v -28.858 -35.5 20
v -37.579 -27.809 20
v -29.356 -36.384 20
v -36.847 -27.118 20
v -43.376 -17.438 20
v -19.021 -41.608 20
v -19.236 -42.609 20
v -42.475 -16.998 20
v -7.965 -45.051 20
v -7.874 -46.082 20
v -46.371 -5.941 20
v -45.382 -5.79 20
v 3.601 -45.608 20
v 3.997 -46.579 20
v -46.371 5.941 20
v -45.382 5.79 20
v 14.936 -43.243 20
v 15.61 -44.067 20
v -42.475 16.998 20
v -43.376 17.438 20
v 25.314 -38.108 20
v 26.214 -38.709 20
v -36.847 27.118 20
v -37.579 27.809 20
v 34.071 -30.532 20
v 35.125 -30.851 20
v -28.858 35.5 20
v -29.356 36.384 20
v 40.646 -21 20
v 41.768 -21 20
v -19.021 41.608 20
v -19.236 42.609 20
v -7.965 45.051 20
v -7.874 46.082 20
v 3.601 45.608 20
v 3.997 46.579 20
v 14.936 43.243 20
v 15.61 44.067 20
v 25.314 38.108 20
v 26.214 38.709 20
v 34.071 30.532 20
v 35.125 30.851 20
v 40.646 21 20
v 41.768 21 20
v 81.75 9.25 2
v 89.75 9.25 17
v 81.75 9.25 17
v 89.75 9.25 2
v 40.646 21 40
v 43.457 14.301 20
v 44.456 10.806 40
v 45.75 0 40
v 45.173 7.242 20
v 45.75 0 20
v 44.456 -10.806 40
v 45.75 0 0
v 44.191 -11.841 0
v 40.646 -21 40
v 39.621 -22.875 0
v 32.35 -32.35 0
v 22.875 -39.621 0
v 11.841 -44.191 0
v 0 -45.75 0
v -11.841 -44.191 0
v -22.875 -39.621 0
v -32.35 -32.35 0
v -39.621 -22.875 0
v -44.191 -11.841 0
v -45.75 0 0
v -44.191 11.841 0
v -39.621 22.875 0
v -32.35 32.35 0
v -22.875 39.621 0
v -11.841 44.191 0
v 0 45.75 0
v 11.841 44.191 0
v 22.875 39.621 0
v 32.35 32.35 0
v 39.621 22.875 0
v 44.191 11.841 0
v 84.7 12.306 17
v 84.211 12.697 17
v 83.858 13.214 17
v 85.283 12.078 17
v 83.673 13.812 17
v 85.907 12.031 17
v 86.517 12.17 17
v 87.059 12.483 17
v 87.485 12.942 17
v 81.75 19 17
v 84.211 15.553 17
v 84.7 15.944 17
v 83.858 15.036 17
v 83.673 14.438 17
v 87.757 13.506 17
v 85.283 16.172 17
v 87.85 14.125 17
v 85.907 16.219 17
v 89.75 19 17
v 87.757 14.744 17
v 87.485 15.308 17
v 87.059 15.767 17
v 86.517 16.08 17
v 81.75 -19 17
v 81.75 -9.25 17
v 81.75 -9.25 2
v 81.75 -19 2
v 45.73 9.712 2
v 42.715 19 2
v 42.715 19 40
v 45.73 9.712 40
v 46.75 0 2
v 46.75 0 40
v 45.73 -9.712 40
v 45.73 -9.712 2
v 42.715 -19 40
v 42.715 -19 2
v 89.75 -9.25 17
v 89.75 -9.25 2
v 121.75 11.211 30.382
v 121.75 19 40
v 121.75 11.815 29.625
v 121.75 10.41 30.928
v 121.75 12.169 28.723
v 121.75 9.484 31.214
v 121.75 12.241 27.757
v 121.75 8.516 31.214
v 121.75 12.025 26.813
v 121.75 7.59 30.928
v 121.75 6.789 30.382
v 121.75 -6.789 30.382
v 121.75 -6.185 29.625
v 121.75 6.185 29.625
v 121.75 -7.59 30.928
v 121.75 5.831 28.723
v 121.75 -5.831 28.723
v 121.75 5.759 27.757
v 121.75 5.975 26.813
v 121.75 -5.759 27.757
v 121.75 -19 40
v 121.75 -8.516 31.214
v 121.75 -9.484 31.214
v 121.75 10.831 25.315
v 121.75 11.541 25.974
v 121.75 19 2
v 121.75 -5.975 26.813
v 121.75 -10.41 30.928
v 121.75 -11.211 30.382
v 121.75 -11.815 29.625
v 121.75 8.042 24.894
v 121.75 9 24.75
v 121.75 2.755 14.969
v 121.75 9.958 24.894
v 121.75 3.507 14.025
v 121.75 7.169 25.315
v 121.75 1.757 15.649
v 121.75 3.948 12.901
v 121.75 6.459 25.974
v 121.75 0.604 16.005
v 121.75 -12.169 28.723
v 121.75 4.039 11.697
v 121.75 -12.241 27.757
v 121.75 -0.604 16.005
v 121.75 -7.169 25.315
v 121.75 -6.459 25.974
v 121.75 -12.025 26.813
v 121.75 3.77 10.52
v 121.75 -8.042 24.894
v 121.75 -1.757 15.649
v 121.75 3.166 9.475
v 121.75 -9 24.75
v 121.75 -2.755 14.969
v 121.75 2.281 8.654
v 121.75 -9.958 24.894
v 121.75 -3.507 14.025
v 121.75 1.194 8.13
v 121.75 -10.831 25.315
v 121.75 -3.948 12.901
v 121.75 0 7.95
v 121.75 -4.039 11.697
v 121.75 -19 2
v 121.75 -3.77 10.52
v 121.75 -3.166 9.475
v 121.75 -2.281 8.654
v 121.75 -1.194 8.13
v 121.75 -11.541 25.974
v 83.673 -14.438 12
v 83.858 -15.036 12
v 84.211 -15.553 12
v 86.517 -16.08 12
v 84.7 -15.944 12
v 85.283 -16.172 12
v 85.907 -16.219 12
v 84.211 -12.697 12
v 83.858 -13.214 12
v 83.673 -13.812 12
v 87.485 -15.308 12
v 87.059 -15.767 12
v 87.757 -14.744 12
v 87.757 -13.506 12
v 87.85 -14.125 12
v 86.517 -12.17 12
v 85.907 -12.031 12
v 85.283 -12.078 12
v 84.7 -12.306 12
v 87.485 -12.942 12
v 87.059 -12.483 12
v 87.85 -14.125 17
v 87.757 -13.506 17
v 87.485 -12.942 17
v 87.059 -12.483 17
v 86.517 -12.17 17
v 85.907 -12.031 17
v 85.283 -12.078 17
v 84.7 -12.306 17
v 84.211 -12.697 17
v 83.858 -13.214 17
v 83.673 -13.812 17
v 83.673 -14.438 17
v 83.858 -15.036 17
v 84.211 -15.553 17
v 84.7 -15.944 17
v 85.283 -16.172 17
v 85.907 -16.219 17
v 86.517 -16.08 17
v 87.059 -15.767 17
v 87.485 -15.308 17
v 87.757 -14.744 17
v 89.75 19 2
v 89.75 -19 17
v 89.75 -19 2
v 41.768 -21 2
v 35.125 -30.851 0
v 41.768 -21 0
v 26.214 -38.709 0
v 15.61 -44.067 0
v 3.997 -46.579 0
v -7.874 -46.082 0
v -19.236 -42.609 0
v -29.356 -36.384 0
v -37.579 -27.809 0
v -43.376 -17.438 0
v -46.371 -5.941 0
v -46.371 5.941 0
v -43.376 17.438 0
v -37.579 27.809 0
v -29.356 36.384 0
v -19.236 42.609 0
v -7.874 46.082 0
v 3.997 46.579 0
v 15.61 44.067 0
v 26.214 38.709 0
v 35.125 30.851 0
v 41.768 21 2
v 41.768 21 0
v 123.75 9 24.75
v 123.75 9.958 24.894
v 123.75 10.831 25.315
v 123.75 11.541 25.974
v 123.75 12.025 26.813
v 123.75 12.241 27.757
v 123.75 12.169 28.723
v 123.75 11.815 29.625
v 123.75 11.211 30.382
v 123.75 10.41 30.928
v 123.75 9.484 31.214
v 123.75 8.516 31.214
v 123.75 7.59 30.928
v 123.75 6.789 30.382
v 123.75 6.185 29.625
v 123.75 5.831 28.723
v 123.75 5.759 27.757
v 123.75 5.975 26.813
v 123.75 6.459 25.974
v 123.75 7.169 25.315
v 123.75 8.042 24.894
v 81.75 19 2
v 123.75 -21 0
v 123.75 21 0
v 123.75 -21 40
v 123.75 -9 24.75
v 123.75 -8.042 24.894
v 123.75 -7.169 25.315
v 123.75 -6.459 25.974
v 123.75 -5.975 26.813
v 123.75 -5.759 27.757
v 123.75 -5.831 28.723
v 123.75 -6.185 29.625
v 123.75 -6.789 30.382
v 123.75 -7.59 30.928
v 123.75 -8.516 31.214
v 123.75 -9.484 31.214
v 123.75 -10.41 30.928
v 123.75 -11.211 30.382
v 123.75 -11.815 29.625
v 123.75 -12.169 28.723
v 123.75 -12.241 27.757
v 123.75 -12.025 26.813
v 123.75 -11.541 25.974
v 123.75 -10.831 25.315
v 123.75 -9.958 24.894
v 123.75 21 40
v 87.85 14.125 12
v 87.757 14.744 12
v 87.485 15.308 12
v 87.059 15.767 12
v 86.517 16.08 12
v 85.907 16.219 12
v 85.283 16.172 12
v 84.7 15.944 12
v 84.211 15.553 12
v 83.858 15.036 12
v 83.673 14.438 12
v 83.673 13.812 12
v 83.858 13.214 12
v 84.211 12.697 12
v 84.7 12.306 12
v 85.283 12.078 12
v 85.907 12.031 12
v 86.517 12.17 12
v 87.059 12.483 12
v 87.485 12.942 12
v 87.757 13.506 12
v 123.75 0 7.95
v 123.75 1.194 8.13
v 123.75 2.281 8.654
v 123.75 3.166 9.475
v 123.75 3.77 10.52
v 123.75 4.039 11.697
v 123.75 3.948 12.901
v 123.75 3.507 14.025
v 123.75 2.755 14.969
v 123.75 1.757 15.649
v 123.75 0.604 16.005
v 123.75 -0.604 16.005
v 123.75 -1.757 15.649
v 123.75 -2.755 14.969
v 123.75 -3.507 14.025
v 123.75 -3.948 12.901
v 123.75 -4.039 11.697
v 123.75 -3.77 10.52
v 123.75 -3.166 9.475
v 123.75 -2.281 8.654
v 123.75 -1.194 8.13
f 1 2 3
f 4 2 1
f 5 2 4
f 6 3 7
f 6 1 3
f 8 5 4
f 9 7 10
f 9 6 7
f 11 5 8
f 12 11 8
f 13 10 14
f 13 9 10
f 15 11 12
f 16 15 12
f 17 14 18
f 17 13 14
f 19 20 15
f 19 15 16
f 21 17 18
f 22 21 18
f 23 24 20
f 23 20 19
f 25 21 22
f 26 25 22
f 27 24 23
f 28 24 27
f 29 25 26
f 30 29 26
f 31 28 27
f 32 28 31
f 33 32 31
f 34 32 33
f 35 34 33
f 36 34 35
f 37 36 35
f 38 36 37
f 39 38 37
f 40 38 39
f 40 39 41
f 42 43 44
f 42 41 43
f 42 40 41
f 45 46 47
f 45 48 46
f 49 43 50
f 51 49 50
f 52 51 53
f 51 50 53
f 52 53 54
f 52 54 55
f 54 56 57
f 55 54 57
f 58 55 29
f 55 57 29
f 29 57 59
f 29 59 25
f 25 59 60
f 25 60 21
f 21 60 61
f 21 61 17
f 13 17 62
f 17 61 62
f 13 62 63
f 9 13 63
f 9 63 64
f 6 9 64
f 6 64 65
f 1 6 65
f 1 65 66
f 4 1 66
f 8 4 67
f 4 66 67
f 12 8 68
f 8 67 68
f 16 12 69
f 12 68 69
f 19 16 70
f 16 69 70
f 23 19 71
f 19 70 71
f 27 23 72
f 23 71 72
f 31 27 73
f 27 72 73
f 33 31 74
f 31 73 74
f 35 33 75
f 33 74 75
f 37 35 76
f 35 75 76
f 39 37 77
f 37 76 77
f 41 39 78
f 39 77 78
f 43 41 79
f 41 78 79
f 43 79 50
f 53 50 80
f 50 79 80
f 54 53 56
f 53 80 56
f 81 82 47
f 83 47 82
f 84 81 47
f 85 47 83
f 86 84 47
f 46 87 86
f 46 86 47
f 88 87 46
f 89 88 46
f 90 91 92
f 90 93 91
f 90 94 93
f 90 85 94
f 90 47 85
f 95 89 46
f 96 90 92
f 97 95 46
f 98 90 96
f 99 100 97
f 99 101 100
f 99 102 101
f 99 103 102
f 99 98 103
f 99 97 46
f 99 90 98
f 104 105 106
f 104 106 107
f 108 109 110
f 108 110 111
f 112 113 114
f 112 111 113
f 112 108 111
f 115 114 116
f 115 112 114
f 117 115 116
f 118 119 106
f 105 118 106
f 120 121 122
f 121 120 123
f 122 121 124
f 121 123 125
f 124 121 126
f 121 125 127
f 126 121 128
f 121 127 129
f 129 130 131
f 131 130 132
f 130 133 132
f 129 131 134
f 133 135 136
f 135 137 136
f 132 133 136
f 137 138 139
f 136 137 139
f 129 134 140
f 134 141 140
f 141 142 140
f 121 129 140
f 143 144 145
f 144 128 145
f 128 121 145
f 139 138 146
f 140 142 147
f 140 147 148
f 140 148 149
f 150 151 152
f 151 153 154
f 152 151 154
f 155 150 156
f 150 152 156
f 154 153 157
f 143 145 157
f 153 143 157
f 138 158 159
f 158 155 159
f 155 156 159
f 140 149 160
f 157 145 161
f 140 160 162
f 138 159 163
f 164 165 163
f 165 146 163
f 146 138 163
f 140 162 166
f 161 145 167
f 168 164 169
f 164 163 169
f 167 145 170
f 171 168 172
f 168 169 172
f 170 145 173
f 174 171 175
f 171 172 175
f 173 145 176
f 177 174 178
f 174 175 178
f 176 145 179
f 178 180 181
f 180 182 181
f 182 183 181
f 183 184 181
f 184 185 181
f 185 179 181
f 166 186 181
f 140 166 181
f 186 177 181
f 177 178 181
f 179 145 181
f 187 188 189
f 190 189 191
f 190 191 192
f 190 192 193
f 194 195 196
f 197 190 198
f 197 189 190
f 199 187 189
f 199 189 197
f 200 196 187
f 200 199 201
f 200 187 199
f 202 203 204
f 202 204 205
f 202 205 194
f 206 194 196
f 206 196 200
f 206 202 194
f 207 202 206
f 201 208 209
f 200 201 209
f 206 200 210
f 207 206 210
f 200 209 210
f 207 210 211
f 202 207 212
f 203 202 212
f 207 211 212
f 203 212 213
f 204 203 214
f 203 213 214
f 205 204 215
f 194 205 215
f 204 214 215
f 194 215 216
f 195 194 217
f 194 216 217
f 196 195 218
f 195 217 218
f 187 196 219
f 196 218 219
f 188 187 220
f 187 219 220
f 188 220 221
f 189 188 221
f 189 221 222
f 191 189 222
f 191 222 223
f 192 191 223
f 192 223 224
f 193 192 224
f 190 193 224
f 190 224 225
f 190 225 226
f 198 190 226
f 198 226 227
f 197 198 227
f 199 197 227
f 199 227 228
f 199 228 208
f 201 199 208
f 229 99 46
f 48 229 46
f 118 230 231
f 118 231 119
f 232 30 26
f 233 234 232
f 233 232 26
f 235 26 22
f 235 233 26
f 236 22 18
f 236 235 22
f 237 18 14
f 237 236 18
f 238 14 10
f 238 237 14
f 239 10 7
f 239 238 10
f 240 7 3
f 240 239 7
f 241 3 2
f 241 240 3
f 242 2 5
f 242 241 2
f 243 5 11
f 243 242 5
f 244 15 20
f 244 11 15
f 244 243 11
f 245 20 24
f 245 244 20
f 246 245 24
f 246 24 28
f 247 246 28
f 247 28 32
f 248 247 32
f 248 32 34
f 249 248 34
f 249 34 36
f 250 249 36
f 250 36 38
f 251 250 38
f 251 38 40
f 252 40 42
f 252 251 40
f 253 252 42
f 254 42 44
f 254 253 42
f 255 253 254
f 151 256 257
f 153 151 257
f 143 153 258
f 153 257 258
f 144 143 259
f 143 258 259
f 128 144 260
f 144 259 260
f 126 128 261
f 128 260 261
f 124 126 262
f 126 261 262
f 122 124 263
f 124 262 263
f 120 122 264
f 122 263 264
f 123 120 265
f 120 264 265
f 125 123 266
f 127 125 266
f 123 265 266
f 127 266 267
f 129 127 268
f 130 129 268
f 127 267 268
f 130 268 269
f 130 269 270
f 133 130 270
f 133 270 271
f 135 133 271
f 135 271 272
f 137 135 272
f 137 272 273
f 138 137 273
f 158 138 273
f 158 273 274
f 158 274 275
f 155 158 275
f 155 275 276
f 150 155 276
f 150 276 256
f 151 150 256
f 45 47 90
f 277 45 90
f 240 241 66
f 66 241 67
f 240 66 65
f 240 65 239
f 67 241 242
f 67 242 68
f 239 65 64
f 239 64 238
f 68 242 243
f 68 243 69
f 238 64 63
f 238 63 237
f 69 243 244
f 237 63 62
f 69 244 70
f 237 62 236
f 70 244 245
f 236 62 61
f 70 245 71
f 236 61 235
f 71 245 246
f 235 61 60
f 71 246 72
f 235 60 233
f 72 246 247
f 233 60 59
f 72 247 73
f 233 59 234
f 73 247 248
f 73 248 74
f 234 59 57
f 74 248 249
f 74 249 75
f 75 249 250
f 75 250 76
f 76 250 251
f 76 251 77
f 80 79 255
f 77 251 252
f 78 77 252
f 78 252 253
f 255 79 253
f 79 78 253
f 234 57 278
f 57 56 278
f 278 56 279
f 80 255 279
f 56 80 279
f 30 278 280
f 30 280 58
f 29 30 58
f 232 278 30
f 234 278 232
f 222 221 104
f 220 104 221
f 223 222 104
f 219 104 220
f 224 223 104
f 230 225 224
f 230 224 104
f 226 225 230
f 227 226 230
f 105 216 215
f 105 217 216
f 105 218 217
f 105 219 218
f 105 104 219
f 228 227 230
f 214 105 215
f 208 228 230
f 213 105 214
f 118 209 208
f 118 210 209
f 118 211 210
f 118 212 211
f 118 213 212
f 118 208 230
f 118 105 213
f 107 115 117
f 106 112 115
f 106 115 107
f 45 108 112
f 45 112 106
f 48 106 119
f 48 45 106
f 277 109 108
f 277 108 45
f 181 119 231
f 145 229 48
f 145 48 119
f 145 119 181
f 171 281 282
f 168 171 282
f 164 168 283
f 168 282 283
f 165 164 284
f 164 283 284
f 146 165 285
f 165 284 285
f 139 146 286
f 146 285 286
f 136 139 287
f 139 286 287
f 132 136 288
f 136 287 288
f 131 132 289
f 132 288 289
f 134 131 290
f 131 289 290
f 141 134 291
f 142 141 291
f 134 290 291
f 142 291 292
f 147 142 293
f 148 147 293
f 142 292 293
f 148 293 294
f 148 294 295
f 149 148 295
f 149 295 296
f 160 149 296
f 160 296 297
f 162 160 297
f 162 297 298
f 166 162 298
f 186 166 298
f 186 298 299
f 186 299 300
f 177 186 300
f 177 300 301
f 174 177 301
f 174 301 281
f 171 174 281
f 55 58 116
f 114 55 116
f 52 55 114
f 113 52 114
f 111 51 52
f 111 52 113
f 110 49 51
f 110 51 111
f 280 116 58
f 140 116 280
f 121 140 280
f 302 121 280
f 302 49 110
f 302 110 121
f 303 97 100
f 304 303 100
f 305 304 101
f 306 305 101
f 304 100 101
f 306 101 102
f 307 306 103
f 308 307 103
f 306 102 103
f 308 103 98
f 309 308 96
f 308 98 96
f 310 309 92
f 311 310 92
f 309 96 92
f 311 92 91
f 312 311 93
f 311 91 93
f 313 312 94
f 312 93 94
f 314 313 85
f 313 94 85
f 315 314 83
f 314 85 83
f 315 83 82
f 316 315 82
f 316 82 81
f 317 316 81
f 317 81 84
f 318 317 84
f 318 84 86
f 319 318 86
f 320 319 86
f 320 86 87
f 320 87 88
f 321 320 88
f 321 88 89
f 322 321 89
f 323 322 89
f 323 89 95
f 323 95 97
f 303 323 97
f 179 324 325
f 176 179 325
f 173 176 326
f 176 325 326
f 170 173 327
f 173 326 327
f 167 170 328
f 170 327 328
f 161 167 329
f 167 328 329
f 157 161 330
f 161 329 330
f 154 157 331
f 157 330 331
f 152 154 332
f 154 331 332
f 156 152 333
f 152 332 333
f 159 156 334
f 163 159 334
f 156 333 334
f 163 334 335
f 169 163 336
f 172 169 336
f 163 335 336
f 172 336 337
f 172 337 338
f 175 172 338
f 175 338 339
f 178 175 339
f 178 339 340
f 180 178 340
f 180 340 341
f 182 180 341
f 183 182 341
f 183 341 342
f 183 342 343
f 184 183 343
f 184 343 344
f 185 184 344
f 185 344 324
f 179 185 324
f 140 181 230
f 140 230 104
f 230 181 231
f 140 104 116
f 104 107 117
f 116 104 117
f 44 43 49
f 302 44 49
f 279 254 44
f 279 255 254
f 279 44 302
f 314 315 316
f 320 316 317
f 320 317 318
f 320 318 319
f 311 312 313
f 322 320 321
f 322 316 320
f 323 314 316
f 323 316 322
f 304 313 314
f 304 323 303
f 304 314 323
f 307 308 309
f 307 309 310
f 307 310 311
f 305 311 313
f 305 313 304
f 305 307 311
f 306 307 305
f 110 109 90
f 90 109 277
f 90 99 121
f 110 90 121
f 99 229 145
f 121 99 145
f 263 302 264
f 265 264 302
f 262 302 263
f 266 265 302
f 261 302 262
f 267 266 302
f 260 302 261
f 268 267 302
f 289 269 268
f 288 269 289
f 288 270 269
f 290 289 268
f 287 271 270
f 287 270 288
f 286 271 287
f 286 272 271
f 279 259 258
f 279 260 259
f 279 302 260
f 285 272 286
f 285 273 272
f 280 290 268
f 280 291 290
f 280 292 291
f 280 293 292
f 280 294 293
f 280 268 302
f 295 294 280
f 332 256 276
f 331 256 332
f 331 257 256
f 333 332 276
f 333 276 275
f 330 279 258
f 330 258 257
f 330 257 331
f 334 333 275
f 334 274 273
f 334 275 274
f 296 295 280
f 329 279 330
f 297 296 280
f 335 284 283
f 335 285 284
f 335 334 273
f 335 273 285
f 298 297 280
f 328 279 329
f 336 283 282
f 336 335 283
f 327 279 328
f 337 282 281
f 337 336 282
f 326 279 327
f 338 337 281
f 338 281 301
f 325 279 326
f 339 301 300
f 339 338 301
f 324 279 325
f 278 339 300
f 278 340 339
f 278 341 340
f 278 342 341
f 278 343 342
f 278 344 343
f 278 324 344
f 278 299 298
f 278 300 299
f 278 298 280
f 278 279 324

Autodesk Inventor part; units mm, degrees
ref_plane "YZ Plane" through (0, 0, 0) normal (1, 0, 0) x (0, 1, 0)
ref_plane "XZ Plane" through (0, 0, 0) normal (0, 1, 0) x (-1, 0, 0)
ref_plane "XY Plane" through (0, 0, 0) normal (0, 0, 1) x (1, 0, 0)
sketch "Sketch1" plane through (0, 0, 0) normal (0, 0, 1) x (1, 0, 0)
  circle A0 centre (0, 0) radius 45.75
  circle A1 centre (0, 0) radius 46.75
  line L0 (45.75, -0.0157) -> (46.75, -0.0157) construction
  line L1 (42.7149, 19) -> (121.75, 19)
  line L2 (121.75, 19) -> (121.75, -19)
  line L3 (121.75, -19) -> (42.7149, -19)
  line L4 (41.768, 21) -> (123.75, 21)
  line L5 (123.75, 21) -> (123.75, -21)
  line L6 (123.75, -21) -> (41.768, -21)
  line L7 (82.759, 21) -> (82.759, 19) construction
  line L8 (121.75, 0) -> (123.75, 0) construction
  line L9 (98.0367, -19) -> (98.0367, -21) construction
  line L10 (0, 0) -> (121.75, 0) construction
  line L11 (41.768, 21) -> (40.6456, 21)
  line L12 (41.768, -21) -> (40.6456, -21)
  dimension "d0" = 91.5
  dimension "d2" = 1
  dimension "d3" = 75
  dimension "d4" = 38
  dimension "d5" = 2
extrude "Extrusion1" add sketch "Sketch1" along normal blind 20 contours A0 L11 A1 L12 | A0 L12 A1 L11
extrude "Extrusion2" add sketch "Sketch1" along normal blind 2 contours L4 L5 L6 A1 L3 L2 L1 | L1 L2 L3 A1
extrude "Extrusion9" add sketch "Sketch1" along normal blind 40 contours A0 L11 A1 L12 | L4 L5 L6 A1 L3 L2 L1 picked at (42.2726, -18.1004)
sketch "Sketch8" plane through (123.75, -21, 0) normal (1, 0, 0) x (0, 0, -1)
  line L0 (0, 0) -> (0, 42) projected
  line L1 (0, 42) -> (-40, 42) projected
  line L2 (-40, 0) -> (-40, 42) projected
  line L3 (0, 0) -> (-40, 0) projected
  circle A0 centre (-12, 21) radius 4.05
  line L4 (-12, 21) -> (-12, 42) construction
  line L5 (-12, 21) -> (-12, 0) construction
  circle A1 centre (-28, 30) radius 3.25
  circle A2 centre (-28, 12) radius 3.25
  line L6 (-28, 30) -> (-28, 12) construction
  line L7 (-40, 21) -> (-28, 21) construction
  point P0 (0, 21)
  dimension "d40" = 8.1
  dimension "d42" = 12
  dimension "d43" = 6.5
  dimension "d44" = 12
  dimension "d61" = 18
extrude "Extrusion10" cut sketch "Sketch8" against normal up to surface (2 mm away) contours A0 | A1 | A2
sketch "Sketch9" plane through (0, 0, 2) normal (0, 0, 1) x (1, 0, 0)
  arc A0 (42.7149, -19) -> (42.7149, 19) centre (0, 0) ccw projected
  line L0 (42.7149, -19) -> (121.75, -19) projected
  line L1 (46.75, 0) -> (81.75, 0) construction
  line L2 (81.75, 19) -> (89.75, 19)
  line L3 (89.75, 19) -> (89.75, 9.25)
  line L4 (89.75, 9.25) -> (81.75, 9.25)
  line L5 (81.75, 9.25) -> (81.75, 19)
  line L6 (81.75, -19) -> (89.75, -19)
  line L7 (89.75, -19) -> (89.75, -9.25)
  line L8 (89.75, -9.25) -> (81.75, -9.25)
  line L9 (81.75, -9.25) -> (81.75, -19)
  line L10 (81.75, 19) -> (81.75, -19) construction
  line L11 (42.7149, 19) -> (121.75, 19) projected
  line L12 (89.75, -19) -> (81.75, -19)
  dimension "d49" = 35
  dimension "d52" = 18.5
  dimension "d53" = 8
extrude "Extrusion11" add sketch "Sketch9" along normal blind 15
sketch "Sketch10" plane through (0, 0, 17) normal (0, 0, 1) x (1, 0, 0)
  line L0 (81.75, 19) -> (89.75, 19) projected
  line L1 (81.75, 19) -> (81.75, 9.25) projected
  line L2 (81.75, 9.25) -> (89.75, 9.25) projected
  line L3 (89.75, 9.25) -> (89.75, 19) projected
  line L4 (89.75, -19) -> (89.75, -9.25) projected
  line L5 (89.75, -9.25) -> (81.75, -9.25) projected
  line L6 (81.75, -9.25) -> (81.75, -19) projected
  line L7 (89.75, -19) -> (81.75, -19) projected
  circle A0 centre (85.75, -14.125) radius 2.1
  circle A1 centre (85.75, 14.125) radius 2.1
  line L8 (89.75, 19) -> (81.75, 9.25) construction
  line L9 (89.75, -9.25) -> (81.75, -19) construction
  point P0 (0, 0)
  dimension "d58" = 4.2
extrude "Extrusion12" cut sketch "Sketch10" against normal blind 5 contours A0 | A1
properties part number "Pump enclosure MM0312"
